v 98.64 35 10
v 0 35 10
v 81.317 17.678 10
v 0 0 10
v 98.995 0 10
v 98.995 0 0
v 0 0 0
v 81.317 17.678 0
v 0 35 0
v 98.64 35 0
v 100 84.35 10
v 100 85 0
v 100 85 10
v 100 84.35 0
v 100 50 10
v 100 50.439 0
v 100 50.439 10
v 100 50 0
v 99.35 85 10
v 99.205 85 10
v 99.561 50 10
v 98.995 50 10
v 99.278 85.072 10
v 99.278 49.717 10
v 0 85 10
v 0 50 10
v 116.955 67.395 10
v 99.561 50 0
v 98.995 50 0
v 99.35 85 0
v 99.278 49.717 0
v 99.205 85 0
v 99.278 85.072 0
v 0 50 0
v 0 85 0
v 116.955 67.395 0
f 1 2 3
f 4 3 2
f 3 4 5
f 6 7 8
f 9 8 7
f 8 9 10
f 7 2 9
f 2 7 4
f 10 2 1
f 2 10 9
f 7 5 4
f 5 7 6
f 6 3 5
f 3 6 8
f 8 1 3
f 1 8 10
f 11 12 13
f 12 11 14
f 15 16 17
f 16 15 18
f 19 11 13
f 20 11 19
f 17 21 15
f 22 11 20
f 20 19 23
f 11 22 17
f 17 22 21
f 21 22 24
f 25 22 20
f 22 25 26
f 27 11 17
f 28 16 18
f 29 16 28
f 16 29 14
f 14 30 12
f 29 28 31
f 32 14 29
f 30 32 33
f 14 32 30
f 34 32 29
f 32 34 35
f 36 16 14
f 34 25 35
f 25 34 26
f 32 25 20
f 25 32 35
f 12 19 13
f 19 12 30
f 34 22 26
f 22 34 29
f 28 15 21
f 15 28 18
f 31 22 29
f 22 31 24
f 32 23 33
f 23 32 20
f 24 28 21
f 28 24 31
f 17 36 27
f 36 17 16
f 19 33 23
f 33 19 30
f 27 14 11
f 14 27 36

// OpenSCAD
//Азотистые основания:

//Аденин
difference (){
cube ([100,35,10]);
rotate ([0,0,45])translate ([70,-80,-1])cube ([35,35,12]);
}

//Тимин
translate ([0,50,0]){
cube ([100,35,10]);
rotate ([0,0,45])translate ([70,-70.4,0])cube ([25,25,10]);
}
